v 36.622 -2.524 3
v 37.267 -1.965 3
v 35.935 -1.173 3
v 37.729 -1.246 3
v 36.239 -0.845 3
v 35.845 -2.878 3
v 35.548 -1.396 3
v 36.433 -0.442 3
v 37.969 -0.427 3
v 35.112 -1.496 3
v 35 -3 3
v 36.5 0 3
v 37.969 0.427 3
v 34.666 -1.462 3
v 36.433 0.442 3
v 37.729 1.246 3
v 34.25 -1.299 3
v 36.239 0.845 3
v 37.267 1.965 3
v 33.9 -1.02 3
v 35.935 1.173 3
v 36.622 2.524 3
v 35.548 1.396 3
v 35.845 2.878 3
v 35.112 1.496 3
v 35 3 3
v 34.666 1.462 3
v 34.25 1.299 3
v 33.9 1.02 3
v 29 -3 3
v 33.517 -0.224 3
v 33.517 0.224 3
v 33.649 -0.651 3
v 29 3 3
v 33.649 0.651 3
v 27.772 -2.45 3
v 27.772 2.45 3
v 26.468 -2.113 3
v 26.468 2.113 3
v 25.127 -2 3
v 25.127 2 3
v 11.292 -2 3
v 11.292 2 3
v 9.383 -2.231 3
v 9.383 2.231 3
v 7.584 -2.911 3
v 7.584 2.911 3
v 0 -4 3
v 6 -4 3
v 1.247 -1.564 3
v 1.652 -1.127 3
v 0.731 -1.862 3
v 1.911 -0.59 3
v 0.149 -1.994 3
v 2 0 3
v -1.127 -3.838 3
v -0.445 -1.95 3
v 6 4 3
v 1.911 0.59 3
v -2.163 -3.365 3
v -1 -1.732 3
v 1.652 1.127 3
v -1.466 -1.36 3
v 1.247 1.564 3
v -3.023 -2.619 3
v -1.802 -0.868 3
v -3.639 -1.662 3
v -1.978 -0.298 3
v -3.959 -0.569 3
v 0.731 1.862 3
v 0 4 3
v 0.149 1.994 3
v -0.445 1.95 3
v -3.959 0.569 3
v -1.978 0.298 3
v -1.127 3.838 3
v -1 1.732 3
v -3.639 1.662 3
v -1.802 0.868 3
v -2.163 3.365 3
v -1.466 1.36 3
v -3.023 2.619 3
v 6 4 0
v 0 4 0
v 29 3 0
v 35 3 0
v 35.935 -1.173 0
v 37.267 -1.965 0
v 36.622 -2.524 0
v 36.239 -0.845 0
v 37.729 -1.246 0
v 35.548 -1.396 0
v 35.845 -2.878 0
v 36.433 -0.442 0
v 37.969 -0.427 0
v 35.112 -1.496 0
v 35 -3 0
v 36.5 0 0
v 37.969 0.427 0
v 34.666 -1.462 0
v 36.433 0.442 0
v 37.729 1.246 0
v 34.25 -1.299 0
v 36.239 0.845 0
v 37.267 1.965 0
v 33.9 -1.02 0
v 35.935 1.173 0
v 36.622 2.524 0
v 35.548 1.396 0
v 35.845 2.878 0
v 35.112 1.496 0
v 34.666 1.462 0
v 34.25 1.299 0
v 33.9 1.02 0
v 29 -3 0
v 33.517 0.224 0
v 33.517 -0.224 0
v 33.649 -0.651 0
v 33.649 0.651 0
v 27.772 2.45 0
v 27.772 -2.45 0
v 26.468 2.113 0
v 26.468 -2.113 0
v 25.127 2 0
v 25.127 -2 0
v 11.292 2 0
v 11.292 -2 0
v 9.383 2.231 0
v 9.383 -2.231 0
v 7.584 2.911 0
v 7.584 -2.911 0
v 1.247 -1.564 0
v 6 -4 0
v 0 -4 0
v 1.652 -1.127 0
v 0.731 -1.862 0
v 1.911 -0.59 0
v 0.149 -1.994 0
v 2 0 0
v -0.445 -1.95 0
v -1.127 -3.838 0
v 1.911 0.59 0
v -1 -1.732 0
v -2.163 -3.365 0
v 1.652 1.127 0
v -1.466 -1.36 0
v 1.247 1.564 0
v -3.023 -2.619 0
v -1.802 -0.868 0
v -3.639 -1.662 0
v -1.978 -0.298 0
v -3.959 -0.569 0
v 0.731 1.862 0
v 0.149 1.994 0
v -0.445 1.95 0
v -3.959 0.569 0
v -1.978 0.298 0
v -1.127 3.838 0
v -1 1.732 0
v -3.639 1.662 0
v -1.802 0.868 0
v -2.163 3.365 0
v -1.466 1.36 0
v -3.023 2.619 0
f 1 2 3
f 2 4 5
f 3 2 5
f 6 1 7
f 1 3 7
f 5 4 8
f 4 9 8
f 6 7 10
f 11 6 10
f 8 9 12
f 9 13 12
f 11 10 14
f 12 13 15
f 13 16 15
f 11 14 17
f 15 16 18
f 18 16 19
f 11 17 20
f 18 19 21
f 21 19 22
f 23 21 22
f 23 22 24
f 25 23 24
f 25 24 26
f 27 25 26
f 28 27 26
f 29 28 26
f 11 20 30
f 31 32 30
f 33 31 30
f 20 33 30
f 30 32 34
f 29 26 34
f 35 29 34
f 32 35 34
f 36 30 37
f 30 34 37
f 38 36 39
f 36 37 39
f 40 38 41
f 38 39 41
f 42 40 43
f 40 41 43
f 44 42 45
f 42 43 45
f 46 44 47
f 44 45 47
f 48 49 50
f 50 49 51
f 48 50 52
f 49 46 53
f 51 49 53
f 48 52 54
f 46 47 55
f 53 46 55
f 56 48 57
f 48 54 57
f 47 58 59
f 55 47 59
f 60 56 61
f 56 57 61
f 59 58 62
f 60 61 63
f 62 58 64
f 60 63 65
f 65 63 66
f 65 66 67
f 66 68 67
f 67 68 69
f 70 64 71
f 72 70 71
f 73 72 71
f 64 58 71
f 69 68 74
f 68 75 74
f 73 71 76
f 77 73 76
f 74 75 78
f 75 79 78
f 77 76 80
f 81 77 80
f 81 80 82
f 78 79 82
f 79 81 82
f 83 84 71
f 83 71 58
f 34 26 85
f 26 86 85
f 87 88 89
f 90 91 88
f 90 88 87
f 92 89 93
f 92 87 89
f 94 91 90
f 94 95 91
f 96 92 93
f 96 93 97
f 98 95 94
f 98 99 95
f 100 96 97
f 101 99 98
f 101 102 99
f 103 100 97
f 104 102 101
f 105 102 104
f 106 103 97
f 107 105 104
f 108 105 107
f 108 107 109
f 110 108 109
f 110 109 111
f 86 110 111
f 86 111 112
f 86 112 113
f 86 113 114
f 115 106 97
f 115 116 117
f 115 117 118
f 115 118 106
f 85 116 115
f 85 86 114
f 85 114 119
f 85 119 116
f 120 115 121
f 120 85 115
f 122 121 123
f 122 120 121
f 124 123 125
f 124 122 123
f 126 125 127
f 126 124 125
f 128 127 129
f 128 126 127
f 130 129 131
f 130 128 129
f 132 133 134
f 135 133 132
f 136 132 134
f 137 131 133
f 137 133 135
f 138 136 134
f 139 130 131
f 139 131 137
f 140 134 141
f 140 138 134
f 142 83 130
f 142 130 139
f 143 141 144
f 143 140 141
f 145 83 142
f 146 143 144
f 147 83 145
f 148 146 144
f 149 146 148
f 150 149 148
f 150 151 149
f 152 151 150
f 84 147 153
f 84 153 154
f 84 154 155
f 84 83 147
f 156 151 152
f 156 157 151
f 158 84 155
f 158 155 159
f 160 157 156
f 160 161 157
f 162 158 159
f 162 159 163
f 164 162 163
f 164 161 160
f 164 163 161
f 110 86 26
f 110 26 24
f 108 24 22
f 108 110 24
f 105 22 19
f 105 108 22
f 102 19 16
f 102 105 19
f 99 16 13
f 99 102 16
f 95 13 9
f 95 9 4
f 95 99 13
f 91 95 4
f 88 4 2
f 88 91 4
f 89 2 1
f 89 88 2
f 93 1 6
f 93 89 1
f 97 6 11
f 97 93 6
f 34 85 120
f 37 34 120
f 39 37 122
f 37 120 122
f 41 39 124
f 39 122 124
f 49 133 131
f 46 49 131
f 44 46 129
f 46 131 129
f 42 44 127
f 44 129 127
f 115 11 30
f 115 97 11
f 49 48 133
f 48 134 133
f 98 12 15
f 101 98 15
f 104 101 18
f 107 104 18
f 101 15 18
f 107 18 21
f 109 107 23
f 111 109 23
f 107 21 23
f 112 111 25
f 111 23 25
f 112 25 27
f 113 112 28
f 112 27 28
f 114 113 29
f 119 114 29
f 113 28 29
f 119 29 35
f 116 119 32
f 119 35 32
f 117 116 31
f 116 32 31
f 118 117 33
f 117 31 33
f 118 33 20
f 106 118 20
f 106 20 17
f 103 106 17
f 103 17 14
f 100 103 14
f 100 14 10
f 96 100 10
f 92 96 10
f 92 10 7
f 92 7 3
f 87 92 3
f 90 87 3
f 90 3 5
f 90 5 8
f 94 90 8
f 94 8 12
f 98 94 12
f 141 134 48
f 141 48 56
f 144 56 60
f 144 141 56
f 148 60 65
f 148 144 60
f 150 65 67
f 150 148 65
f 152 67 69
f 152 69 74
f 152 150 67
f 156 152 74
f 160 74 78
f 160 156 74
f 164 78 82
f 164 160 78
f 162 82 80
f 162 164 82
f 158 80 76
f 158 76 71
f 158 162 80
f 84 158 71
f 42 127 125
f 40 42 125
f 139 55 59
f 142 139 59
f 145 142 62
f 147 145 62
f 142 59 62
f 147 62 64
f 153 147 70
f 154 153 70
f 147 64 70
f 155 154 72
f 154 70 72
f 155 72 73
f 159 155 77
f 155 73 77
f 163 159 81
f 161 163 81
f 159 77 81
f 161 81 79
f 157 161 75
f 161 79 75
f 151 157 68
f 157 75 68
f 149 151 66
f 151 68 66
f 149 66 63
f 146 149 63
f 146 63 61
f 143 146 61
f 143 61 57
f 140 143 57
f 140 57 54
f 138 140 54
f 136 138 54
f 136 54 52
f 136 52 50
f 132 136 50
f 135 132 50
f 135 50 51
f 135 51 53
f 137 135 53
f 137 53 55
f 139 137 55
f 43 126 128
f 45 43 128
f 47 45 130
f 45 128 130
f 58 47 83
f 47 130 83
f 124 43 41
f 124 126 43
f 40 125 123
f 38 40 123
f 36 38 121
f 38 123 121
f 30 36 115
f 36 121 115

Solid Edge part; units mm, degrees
sketch "Sketch1" plane through (0, 0, 0) normal (0, 0, 1) x (1, 0, 0)
  arc A0 (0, -4) -> (0, 4) centre (0, 0) cw
  line L0 (0, 4) -> (6, 4)
  line L1 (6, 4) -> (6, 2)
  line L2 (6, 2) -> (29, 2)
  line L3 (29, 2) -> (29, 3)
  line L4 (35, 3) -> (29, 3)
  arc A1 (35, 3) -> (35, -3) centre (35, 0) cw
  line L5 (35, -3) -> (29, -3)
  line L6 (29, -2) -> (29, -3)
  line L7 (6, -2) -> (29, -2)
  line L8 (6, -4) -> (6, -2)
  line L9 (0, -4) -> (6, -4)
extrude "Protrusion1" add sketch "Sketch1" along normal blind 3
sketch "Sketch2" plane through (17, 0, 3) normal (0, 0, 1) x (1, 0, 0)
  circle A0 centre (-17, 0) radius 2
  circle A1 centre (18, 0) radius 1.5
extrude "Cutout1" cut sketch "Sketch2" against normal through all
fillet "Rounding" radius 8 4 edges at (6, -2, 1.5) (6, 2, 1.5) (29, 2, 1.5) (29, -2, 1.5)
